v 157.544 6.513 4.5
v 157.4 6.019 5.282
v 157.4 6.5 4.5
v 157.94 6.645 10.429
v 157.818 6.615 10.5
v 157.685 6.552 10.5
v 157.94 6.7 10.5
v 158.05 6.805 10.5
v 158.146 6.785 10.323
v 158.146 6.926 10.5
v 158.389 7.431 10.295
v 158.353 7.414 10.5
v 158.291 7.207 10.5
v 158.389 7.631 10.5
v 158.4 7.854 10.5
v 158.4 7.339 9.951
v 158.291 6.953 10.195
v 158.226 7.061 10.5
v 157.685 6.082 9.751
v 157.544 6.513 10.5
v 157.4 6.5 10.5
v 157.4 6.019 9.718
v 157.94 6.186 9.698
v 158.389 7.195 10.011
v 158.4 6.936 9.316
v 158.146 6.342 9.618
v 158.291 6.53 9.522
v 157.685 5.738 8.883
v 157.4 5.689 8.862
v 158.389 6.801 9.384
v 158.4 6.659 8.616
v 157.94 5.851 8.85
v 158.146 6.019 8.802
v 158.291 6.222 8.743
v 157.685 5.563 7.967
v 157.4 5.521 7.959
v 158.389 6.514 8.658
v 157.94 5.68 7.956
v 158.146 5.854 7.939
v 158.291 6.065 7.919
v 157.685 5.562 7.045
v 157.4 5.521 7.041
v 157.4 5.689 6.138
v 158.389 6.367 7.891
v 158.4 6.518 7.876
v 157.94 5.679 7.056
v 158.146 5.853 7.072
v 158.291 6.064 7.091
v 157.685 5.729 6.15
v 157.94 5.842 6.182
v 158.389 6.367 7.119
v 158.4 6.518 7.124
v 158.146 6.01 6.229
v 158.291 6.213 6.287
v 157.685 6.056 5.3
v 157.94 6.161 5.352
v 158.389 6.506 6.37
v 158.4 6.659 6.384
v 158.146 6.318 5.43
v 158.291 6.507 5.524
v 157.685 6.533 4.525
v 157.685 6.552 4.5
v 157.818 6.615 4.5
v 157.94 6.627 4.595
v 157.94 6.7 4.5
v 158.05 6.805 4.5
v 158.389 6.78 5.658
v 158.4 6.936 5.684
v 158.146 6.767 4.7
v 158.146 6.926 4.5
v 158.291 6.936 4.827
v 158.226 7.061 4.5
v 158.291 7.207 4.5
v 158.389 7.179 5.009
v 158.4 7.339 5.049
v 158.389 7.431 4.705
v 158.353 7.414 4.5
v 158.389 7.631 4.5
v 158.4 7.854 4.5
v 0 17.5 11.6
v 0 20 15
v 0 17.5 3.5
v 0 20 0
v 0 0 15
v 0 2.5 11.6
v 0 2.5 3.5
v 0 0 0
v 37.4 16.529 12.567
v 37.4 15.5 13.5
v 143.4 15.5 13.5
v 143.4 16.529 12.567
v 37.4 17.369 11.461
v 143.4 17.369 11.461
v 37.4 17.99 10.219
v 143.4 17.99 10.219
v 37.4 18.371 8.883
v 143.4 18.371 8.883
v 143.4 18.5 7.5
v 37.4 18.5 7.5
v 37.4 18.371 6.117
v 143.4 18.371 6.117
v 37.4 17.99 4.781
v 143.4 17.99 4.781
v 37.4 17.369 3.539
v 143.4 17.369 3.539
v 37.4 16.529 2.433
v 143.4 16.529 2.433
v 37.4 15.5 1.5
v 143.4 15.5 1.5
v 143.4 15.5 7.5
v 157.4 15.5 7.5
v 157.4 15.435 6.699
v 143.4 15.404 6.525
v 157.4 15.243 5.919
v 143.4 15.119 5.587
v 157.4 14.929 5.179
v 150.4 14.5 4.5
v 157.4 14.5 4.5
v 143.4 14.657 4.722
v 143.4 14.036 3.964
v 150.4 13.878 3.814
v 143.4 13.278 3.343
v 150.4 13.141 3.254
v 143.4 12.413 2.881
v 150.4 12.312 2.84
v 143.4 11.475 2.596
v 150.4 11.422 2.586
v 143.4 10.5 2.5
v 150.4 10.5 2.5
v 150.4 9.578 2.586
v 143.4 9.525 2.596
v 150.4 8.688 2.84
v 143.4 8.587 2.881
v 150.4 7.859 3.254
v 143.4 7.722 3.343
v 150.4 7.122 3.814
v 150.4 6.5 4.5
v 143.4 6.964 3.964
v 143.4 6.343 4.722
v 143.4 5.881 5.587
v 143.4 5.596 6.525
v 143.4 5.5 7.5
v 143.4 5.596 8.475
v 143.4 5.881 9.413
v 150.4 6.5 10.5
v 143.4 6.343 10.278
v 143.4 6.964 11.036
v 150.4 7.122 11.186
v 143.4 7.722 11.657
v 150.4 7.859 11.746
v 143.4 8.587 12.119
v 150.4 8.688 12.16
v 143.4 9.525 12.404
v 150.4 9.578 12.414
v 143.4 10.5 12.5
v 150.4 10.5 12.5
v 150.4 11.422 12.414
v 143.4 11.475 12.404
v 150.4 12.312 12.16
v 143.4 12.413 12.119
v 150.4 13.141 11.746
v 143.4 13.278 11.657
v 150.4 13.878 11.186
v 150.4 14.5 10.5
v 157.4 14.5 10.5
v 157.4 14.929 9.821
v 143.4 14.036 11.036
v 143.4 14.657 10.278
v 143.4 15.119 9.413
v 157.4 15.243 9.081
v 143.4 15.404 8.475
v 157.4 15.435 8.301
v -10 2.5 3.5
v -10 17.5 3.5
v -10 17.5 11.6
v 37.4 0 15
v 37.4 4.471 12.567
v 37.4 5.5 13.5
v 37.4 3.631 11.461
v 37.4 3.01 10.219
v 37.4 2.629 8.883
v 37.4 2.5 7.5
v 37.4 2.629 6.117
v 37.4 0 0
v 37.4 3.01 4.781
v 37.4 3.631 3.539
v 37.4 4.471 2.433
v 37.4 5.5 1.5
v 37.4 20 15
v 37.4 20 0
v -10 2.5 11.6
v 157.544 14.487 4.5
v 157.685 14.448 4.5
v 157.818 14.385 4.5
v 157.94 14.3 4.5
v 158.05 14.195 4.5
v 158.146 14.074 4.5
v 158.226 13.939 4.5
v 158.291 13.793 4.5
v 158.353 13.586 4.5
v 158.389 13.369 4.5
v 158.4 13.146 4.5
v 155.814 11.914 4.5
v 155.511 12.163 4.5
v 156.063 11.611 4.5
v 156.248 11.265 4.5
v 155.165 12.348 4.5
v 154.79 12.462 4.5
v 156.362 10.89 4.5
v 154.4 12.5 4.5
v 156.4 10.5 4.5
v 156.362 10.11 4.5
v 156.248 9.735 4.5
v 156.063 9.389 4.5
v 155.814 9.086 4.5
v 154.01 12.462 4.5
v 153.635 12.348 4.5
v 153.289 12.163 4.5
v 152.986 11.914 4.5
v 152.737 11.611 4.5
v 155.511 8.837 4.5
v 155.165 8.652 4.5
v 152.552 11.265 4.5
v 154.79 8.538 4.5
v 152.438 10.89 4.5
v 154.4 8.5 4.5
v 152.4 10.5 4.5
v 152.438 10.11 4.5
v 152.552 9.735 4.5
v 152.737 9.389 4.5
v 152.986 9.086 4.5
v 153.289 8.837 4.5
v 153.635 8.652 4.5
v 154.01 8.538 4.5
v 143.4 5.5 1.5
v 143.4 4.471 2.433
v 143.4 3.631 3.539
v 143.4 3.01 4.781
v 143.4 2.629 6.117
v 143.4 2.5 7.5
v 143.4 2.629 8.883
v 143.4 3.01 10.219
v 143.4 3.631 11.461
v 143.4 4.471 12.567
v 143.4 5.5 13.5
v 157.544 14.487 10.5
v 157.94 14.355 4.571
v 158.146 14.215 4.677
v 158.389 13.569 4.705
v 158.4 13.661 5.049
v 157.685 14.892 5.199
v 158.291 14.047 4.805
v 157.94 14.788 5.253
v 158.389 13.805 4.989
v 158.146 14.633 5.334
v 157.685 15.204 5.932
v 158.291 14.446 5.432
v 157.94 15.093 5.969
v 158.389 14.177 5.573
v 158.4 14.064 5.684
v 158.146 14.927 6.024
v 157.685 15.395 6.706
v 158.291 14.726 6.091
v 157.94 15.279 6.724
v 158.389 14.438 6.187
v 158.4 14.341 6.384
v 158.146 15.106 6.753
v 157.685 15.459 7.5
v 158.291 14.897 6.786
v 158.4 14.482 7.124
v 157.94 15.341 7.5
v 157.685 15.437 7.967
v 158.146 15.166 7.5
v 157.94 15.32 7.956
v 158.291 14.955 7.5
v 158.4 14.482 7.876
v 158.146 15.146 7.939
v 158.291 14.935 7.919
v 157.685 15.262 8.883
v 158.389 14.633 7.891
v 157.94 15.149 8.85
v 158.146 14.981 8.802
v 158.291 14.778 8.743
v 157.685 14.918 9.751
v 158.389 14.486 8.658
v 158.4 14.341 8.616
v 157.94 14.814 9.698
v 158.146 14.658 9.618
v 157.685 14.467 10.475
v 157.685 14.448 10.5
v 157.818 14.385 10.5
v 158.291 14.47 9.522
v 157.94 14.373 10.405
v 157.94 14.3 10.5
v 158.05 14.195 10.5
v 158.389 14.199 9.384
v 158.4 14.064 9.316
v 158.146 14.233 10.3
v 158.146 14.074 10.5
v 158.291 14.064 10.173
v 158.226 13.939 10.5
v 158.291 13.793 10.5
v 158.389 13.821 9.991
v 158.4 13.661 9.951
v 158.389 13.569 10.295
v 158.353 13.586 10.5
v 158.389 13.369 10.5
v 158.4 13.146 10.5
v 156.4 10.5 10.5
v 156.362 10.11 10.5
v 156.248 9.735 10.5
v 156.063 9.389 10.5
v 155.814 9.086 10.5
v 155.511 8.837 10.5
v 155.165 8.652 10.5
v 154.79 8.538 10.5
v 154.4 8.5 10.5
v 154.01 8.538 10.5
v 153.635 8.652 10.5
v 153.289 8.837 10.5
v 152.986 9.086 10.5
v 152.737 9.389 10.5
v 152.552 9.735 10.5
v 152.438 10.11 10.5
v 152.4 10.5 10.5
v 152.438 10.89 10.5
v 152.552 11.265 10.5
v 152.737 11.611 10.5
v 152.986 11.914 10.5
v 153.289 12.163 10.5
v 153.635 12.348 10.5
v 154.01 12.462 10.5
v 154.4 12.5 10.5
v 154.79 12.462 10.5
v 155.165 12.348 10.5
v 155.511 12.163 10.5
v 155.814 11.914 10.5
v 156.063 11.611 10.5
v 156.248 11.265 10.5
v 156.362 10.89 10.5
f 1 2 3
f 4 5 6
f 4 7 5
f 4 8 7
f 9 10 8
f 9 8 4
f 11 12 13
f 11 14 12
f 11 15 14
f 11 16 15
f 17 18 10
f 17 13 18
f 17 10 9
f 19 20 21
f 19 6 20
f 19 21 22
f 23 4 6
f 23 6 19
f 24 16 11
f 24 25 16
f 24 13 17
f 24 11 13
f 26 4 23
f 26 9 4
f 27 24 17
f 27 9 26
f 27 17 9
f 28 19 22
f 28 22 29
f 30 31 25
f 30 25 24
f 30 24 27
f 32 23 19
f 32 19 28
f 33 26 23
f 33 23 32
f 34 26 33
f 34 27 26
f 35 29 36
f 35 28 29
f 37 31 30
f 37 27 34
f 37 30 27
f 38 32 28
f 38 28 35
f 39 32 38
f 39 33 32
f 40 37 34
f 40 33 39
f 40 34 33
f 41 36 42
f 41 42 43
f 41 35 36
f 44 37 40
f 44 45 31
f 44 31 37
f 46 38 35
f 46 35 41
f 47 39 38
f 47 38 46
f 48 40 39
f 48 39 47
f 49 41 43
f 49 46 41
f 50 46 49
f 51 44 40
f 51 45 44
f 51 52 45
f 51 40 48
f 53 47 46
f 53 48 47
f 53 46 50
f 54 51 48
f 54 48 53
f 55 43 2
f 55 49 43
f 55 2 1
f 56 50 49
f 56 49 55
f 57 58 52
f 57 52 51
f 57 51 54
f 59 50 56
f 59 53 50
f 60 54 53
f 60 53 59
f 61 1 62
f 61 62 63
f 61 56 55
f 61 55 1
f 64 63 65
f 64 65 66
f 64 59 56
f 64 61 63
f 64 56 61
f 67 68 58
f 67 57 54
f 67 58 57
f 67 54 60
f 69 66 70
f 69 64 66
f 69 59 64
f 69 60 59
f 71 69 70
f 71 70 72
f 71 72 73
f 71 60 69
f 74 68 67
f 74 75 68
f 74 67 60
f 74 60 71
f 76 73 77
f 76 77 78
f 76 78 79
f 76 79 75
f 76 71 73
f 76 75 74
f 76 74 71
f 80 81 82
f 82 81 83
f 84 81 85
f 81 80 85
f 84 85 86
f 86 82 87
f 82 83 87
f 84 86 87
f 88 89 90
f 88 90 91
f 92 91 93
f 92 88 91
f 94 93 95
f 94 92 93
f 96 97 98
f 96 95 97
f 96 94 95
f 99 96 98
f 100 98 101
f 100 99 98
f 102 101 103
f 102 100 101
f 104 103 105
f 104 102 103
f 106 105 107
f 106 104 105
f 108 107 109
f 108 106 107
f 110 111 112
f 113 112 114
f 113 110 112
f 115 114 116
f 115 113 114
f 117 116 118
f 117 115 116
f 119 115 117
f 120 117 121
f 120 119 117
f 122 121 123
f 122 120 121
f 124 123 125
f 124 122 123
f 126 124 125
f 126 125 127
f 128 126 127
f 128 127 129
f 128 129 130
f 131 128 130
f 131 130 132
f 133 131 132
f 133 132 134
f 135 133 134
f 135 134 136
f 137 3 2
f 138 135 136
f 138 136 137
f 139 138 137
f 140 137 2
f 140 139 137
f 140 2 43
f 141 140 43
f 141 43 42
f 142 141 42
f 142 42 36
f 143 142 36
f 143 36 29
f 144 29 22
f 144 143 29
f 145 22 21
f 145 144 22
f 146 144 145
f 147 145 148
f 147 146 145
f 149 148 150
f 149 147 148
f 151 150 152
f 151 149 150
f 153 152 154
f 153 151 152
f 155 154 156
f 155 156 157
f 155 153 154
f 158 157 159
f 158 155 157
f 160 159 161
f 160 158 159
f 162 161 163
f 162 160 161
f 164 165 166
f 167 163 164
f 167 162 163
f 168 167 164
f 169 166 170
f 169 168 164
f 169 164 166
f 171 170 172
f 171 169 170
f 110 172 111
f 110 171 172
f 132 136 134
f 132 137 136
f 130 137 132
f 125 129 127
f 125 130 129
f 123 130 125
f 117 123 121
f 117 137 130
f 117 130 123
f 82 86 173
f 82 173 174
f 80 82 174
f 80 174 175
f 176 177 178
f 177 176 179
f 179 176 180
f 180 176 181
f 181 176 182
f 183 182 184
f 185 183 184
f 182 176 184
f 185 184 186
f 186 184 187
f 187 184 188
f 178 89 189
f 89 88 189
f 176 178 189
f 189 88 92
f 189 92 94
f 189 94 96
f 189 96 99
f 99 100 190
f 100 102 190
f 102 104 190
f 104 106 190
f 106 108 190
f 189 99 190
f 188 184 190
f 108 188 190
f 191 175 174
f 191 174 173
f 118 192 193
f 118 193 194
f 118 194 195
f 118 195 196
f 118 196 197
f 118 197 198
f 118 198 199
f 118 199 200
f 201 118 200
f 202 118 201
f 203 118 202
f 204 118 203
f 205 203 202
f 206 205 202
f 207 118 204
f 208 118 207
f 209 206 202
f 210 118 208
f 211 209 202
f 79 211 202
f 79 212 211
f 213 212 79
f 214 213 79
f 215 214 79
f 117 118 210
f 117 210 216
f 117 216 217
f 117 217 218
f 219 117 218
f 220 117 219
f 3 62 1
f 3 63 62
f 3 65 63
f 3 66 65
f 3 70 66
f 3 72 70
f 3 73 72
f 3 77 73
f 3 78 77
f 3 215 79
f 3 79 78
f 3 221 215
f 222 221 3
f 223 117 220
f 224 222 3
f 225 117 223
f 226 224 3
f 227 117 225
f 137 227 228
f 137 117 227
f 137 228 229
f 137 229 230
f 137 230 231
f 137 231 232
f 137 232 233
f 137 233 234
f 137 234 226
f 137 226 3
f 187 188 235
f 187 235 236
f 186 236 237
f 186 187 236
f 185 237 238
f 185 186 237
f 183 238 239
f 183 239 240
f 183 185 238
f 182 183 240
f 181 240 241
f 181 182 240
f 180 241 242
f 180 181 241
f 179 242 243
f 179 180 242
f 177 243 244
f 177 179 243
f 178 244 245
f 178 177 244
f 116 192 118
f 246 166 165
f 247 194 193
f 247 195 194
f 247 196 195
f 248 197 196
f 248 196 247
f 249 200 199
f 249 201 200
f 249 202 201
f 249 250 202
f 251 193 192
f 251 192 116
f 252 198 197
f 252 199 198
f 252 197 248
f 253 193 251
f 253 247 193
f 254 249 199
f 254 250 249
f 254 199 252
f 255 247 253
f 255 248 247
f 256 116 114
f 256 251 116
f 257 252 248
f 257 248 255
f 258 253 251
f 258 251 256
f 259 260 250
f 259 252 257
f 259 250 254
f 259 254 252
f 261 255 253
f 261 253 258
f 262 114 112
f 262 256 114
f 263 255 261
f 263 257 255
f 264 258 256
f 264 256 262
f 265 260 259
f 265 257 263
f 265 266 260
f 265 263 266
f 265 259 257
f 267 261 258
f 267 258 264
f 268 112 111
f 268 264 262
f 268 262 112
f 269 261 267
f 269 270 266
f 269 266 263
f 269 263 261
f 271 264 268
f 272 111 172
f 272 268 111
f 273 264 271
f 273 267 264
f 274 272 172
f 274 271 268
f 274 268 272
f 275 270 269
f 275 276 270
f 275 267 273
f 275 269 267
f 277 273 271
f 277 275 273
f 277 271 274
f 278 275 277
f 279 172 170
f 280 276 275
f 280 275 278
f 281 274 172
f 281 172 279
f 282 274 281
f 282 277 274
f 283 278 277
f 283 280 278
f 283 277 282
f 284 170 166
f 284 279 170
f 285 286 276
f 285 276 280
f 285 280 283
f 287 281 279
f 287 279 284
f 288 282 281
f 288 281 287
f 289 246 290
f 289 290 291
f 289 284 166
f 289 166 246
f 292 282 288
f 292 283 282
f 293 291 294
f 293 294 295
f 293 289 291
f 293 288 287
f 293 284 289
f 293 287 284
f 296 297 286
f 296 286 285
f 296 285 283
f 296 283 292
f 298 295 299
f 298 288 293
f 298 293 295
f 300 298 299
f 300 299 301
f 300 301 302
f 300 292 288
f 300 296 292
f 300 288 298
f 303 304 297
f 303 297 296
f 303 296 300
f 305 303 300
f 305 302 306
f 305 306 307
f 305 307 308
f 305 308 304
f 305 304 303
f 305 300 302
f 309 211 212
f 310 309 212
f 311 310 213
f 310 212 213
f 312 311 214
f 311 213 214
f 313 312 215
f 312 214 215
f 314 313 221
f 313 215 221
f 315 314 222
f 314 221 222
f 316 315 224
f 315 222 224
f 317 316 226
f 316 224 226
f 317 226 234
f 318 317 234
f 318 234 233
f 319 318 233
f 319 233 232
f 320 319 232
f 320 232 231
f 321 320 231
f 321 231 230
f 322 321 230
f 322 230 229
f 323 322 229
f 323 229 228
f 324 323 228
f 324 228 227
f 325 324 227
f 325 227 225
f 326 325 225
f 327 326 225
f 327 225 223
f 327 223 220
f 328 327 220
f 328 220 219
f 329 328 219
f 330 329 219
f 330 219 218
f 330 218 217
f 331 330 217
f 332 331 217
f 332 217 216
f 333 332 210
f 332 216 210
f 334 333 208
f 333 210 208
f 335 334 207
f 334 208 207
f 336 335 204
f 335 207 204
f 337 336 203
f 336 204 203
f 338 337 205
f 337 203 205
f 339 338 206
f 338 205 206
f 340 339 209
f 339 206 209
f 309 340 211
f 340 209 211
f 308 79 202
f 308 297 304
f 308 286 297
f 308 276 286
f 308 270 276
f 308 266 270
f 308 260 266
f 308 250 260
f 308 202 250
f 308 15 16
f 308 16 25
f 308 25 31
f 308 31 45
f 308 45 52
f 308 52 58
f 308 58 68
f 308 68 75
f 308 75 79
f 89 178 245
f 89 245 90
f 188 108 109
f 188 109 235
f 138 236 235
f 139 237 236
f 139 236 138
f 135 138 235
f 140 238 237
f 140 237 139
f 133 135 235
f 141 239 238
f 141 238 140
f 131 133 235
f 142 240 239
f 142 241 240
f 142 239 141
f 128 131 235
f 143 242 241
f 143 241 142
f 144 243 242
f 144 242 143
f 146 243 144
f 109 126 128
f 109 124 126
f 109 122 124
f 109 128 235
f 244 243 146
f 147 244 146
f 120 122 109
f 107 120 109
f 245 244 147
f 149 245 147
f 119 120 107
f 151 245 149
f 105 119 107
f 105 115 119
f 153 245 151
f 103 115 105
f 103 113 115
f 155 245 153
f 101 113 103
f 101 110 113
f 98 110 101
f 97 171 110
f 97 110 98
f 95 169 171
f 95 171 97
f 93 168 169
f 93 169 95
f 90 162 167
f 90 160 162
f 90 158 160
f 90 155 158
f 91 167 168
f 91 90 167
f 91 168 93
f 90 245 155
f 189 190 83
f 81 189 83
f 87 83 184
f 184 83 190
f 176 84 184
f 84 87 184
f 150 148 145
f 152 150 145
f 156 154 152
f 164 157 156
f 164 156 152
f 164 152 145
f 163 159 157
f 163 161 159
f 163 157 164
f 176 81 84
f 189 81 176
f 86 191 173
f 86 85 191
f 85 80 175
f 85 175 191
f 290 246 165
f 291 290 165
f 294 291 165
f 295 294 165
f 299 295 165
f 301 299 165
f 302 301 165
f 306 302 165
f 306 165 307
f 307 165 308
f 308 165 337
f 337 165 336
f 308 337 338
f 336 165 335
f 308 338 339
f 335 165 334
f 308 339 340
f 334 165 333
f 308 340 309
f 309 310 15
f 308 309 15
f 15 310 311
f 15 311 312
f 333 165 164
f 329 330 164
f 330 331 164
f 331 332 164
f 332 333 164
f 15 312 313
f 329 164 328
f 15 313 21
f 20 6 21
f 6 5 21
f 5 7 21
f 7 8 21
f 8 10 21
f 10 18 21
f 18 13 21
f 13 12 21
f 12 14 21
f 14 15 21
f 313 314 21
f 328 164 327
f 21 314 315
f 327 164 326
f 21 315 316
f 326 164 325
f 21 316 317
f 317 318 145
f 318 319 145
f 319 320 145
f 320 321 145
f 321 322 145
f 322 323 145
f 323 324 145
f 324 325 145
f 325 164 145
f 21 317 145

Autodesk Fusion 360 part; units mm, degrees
sketch "Sketch1" plane through (0, 0, 0) normal (0, 0, 1) x (1, 0, 0)
  line L0 (0, 0) -> (37.4, 0)
  line L1 (37.4, 0) -> (37.4, 20)
  line L2 (37.4, 20) -> (0, 20)
  line L3 (0, 20) -> (0, 0)
  dimension "d1" = 37.4
  dimension "d2" = 20
extrude "Extrude1" add sketch "Sketch1" along normal blind 15
sketch "Sketch2" plane through (37.4, 0, 0) normal (1, 0, 0) x (0, 1, 0)
  line L0 (0, 0) -> (20, 0)
  line L1 (20, 0) -> (20, 15)
  line L2 (20, 15) -> (0, 15)
  line L3 (0, 15) -> (0, 0)
  line L4 (2.5, 13.5) -> (18.5, 13.5)
  line L5 (18.5, 13.5) -> (18.5, 1.5)
  line L6 (18.5, 1.5) -> (2.5, 1.5)
  line L7 (2.5, 1.5) -> (2.5, 13.5)
  line L8 (2.5, 13.5) -> (5.5, 13.5)
  line L9 (2.5, 1.5) -> (5.5, 1.5)
  arc A0 (5.5, 13.5) -> (5.5, 1.5) centre (10, 7.5) ccw
  line L10 (10.5, 13.5) -> (10.5, 1.5)
  arc A1 (15.5, 1.5) -> (15.5, 13.5) centre (11, 7.5) ccw
  dimension "d5" = 16
  dimension "d6" = 12
  dimension "d7" = 1.5
  dimension "d8" = 1.5
  dimension "d9" = 3
  dimension "d10" = 3
  dimension "d23" = 10
extrude "Extrude2" add sketch "Sketch2" along normal blind 106 contours L4 L6 A0 L10 | L4 L6 L10 A1
sketch "Sketch3" plane through (0, 0, 0) normal (-1, 0, 0) x (0, -1, 0)
  line L0 (-20, 0) -> (0, 0)
  line L1 (0, 0) -> (0, 15)
  line L2 (0, 15) -> (-20, 15)
  line L3 (-20, 15) -> (-20, 0)
  line L4 (-2.5, 3.5) -> (-17.5, 3.5)
  line L5 (-17.5, 3.5) -> (-17.5, 11.6)
  line L6 (-17.5, 11.6) -> (-2.5, 11.6)
  line L7 (-2.5, 11.6) -> (-2.5, 3.5)
  line L8 (-10, 0) -> (-10, 15)
  line L9 (-20, 7.5) -> (0, 7.5)
  dimension "d13" = 15
  dimension "d14" = 8.1
  dimension "d15" = 4
  dimension "d16" = 7.5
extrude "Extrude3" add sketch "Sketch3" along normal blind 10 contours L4 L7 L8 L9 | L4 L5 L8 L9 | L5 L6 L8 L9 | L6 L7 L8 L9
fillet "Fillet1" [suppressed]
fillet "Fillet2" [suppressed]
sketch "Sketch4" plane through (143.4, 0, 0) normal (1, 0, 0) x (0, 1, 0)
  arc A0 (5.5, 13.5) -> (5.5, 1.5) centre (10, 7.5) ccw
  line L0 (5.5, 1.5) -> (15.5, 1.5)
  arc A1 (15.5, 1.5) -> (15.5, 13.5) centre (11, 7.5) ccw
  line L1 (15.5, 13.5) -> (5.5, 13.5)
  line L2 (5.5, 13.5) -> (15.5, 1.5)
  circle A2 centre (10.5, 7.5) radius 5
  dimension "d24" = 10
extrude "Extrude4" add sketch "Sketch4" along normal blind 7 contours L2 A2 | L2 A2
sketch "Sketch5" plane through (150.4, 0, 0) normal (1, 0, 0) x (0, 1, 0)
  circle A0 centre (10.5, 7.5) radius 5
  line L0 (10.5, 7.5) -> (15.5, 7.5)
  line L1 (14.5, 10.5) -> (6.5, 10.5)
  line L2 (14.5, 4.5) -> (6.5, 4.5)
  dimension "d27" = 3
extrude "Extrude5" add sketch "Sketch5" along normal blind 8 contours A0 L1 L2
sketch "Sketch6" plane through (0, 0, 4.5) normal (0, 0, -1) x (1, 0, 0)
  line L0 (150.4, -6.5) -> (150.4, -14.5)
  line L1 (150.4, -14.5) -> (158.4, -14.5)
  line L2 (158.4, -14.5) -> (158.4, -6.5)
  line L3 (158.4, -6.5) -> (150.4, -6.5)
  line L4 (158.4, -6.5) -> (150.4, -14.5)
  circle A0 centre (154.4, -10.5) radius 2
  dimension "d30" = 4
extrude "Extrude6" cut sketch "Sketch6" against normal blind 9 contours L4 A0 | L4 A0
fillet "Fillet3" radius 1 2 edges at (158.4, 5.5, 7.5) (158.4, 15.5, 7.5)
equation "d10 = d9"
